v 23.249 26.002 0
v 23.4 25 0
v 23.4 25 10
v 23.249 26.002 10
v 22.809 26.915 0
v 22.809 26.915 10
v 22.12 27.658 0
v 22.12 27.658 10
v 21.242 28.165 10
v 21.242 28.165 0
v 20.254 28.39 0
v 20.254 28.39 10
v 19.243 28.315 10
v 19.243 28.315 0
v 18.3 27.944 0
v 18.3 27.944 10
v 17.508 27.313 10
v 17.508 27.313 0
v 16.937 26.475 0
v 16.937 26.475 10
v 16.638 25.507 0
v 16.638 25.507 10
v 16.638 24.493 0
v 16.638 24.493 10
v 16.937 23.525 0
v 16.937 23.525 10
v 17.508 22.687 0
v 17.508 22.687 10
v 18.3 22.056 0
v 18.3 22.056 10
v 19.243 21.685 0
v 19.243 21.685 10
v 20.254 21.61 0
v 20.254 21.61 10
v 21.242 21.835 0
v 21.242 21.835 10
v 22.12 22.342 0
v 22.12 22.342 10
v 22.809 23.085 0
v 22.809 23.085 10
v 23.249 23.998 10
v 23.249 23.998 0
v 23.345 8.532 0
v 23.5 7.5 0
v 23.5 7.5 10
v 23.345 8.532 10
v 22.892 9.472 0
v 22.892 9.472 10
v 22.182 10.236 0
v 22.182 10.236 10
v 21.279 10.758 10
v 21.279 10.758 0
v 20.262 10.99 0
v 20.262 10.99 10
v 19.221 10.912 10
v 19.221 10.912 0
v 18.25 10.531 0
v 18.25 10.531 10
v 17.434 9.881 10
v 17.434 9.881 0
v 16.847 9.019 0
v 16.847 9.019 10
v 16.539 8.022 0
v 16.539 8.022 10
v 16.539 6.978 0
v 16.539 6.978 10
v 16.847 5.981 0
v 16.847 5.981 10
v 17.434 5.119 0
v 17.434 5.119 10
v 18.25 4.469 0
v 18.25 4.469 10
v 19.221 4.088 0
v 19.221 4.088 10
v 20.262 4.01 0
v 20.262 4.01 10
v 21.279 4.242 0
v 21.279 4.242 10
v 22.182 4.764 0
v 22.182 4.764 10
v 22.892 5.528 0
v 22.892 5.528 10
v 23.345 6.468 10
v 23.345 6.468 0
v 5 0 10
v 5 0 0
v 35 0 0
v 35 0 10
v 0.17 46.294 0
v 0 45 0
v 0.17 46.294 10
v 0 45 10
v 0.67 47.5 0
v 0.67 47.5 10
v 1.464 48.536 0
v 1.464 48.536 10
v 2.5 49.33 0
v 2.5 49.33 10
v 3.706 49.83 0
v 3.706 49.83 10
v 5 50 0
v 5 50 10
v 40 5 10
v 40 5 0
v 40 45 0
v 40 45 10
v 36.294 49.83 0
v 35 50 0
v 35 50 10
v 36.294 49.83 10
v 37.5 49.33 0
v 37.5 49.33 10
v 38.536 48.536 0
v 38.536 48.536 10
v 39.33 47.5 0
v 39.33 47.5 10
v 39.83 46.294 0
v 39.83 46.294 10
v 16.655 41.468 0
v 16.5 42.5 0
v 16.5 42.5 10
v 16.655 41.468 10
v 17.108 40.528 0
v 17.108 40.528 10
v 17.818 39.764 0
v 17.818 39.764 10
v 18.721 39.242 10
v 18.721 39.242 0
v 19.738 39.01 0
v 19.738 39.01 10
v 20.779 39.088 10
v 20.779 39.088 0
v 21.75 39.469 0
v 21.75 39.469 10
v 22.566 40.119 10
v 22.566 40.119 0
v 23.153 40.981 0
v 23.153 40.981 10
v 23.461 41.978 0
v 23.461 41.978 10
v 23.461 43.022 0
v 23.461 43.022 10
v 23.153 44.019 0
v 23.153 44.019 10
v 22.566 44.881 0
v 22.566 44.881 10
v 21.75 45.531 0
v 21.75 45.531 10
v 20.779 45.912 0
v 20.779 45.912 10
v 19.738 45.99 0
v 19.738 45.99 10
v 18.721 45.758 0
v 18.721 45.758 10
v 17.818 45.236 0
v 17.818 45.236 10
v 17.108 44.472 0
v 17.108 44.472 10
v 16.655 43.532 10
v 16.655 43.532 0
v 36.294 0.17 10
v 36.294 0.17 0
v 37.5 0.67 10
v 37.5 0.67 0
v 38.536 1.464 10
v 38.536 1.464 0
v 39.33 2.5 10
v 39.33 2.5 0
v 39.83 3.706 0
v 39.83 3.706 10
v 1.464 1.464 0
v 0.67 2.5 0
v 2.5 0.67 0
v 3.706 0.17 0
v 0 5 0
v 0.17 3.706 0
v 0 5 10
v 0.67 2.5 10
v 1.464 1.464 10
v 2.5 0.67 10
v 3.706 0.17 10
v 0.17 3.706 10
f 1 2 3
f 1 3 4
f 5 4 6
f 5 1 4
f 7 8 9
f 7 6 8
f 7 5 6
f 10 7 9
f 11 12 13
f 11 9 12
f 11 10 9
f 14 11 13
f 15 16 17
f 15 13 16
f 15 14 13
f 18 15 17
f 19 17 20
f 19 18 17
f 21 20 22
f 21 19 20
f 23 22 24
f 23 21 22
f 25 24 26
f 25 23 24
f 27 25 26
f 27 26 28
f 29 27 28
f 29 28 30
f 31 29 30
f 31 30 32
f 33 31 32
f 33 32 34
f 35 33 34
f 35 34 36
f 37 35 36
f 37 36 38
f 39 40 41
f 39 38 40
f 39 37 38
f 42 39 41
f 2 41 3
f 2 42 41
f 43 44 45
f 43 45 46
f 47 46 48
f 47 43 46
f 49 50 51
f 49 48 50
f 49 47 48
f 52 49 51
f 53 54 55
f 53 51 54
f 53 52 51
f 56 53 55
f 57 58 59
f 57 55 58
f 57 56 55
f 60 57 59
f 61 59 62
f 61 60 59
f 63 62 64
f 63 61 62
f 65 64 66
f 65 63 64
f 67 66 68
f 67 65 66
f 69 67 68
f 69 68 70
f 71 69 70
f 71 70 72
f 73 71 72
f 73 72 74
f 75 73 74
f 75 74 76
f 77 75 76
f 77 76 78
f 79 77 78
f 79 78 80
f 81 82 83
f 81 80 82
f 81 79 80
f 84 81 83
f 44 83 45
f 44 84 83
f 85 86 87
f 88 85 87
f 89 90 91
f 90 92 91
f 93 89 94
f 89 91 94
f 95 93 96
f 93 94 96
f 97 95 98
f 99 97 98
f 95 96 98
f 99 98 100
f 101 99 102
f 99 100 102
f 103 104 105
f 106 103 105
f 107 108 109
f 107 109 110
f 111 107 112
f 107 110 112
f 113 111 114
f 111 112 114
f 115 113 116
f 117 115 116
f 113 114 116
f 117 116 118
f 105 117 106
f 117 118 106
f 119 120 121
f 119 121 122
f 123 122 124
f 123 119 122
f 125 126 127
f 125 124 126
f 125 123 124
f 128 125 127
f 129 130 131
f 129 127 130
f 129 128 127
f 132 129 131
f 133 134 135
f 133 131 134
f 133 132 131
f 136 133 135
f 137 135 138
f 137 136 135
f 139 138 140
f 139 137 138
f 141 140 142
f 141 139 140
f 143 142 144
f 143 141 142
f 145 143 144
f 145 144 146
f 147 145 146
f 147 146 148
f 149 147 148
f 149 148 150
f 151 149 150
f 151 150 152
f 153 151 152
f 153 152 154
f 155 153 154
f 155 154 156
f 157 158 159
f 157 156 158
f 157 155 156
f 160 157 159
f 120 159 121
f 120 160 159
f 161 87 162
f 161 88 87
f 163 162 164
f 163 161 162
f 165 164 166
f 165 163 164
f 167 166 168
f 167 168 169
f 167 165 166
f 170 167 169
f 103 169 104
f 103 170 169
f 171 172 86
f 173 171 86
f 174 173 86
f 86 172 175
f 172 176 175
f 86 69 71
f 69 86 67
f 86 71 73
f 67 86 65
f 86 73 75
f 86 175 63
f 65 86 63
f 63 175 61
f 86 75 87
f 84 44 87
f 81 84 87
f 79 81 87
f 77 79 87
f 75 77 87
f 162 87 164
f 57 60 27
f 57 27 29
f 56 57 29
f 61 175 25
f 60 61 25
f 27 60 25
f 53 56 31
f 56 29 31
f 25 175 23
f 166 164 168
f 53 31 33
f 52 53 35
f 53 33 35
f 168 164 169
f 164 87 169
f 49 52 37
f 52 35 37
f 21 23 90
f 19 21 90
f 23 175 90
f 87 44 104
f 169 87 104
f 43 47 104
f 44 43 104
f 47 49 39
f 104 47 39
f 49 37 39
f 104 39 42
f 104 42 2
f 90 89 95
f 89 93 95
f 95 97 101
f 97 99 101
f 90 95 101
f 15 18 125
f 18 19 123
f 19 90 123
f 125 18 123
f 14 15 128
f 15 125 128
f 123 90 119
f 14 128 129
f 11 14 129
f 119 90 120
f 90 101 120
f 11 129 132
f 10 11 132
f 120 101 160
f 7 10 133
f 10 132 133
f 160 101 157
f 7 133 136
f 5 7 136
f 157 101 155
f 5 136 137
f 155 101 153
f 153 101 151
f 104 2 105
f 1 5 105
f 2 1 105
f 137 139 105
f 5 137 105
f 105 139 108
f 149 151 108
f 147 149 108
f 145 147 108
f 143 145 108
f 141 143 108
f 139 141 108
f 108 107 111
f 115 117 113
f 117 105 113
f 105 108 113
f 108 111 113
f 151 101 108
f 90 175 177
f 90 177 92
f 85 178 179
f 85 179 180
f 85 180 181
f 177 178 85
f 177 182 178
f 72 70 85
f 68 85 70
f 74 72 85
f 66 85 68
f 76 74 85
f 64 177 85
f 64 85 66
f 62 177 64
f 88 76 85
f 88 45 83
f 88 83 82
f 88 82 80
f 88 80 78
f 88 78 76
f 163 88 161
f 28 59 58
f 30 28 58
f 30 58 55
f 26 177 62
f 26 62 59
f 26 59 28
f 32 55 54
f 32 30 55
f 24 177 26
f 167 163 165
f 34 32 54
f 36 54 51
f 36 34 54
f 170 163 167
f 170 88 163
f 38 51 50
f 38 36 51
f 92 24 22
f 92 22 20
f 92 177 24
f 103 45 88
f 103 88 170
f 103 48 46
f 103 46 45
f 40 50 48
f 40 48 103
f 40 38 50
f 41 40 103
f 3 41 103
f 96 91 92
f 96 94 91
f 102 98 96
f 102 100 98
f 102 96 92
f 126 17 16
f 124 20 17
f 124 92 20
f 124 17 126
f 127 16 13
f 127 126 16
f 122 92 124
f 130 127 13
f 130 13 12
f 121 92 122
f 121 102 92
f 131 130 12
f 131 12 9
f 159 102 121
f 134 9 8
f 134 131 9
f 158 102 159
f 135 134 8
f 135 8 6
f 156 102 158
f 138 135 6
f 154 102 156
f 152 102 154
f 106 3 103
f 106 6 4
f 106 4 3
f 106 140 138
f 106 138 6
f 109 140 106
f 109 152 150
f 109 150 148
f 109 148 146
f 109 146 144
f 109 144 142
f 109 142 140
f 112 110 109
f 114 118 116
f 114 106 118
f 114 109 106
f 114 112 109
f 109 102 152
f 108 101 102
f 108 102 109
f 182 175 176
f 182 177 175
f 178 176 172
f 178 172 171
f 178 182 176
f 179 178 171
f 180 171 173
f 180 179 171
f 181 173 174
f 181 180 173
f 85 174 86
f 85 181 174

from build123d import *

# Parameters (mm, degrees)
ESQUISSE1_W                  = 40
ESQUISSE1_H                  = 50
BOSS_EXTRU_1_DEPTH           = 10
ENL_V_MAT_EXTRU_1_DEPTH      = 65.807406984
ENL_V_MAT_EXTRU_1_DEPTH_BACK = 65.807406984
ESQUISSE2_R                  = 3.4
ESQUISSE2_R_2                = 3.5
CONG_1_R                     = 5


with BuildPart() as part:
    # Esquisse1 → Boss.-Extru.1 (new body)
    with BuildSketch(Plane.XY):
        with Locations((20, 25)):
            Rectangle(ESQUISSE1_W, ESQUISSE1_H)
    extrude(amount=BOSS_EXTRU_1_DEPTH)

    # Esquisse2 → Enlèv. mat.-Extru.1 (cut, two sides: drawn at the far end of the back side and taken through both)
    with BuildSketch(Plane.XY.offset(10).offset(-ENL_V_MAT_EXTRU_1_DEPTH_BACK)):
        with Locations((20, 25)):
            Circle(ESQUISSE2_R)
        with Locations((20, 7.5)):
            Circle(ESQUISSE2_R_2)
        with Locations(Location((20, 42.5, 0), (0, 0, 180))):
            Circle(ESQUISSE2_R_2)
    extrude(amount=ENL_V_MAT_EXTRU_1_DEPTH + ENL_V_MAT_EXTRU_1_DEPTH_BACK, mode=Mode.SUBTRACT)

    # Congé1
    cong_1_edges = [part.edges().sort_by_distance(p)[0] for p in [
        (0, 50, 5),
        (40, 50, 5),
        (40, 0, 5),
        (0, 0, 5),
    ]]
    fillet(cong_1_edges, radius=CONG_1_R)


solid = part.part
